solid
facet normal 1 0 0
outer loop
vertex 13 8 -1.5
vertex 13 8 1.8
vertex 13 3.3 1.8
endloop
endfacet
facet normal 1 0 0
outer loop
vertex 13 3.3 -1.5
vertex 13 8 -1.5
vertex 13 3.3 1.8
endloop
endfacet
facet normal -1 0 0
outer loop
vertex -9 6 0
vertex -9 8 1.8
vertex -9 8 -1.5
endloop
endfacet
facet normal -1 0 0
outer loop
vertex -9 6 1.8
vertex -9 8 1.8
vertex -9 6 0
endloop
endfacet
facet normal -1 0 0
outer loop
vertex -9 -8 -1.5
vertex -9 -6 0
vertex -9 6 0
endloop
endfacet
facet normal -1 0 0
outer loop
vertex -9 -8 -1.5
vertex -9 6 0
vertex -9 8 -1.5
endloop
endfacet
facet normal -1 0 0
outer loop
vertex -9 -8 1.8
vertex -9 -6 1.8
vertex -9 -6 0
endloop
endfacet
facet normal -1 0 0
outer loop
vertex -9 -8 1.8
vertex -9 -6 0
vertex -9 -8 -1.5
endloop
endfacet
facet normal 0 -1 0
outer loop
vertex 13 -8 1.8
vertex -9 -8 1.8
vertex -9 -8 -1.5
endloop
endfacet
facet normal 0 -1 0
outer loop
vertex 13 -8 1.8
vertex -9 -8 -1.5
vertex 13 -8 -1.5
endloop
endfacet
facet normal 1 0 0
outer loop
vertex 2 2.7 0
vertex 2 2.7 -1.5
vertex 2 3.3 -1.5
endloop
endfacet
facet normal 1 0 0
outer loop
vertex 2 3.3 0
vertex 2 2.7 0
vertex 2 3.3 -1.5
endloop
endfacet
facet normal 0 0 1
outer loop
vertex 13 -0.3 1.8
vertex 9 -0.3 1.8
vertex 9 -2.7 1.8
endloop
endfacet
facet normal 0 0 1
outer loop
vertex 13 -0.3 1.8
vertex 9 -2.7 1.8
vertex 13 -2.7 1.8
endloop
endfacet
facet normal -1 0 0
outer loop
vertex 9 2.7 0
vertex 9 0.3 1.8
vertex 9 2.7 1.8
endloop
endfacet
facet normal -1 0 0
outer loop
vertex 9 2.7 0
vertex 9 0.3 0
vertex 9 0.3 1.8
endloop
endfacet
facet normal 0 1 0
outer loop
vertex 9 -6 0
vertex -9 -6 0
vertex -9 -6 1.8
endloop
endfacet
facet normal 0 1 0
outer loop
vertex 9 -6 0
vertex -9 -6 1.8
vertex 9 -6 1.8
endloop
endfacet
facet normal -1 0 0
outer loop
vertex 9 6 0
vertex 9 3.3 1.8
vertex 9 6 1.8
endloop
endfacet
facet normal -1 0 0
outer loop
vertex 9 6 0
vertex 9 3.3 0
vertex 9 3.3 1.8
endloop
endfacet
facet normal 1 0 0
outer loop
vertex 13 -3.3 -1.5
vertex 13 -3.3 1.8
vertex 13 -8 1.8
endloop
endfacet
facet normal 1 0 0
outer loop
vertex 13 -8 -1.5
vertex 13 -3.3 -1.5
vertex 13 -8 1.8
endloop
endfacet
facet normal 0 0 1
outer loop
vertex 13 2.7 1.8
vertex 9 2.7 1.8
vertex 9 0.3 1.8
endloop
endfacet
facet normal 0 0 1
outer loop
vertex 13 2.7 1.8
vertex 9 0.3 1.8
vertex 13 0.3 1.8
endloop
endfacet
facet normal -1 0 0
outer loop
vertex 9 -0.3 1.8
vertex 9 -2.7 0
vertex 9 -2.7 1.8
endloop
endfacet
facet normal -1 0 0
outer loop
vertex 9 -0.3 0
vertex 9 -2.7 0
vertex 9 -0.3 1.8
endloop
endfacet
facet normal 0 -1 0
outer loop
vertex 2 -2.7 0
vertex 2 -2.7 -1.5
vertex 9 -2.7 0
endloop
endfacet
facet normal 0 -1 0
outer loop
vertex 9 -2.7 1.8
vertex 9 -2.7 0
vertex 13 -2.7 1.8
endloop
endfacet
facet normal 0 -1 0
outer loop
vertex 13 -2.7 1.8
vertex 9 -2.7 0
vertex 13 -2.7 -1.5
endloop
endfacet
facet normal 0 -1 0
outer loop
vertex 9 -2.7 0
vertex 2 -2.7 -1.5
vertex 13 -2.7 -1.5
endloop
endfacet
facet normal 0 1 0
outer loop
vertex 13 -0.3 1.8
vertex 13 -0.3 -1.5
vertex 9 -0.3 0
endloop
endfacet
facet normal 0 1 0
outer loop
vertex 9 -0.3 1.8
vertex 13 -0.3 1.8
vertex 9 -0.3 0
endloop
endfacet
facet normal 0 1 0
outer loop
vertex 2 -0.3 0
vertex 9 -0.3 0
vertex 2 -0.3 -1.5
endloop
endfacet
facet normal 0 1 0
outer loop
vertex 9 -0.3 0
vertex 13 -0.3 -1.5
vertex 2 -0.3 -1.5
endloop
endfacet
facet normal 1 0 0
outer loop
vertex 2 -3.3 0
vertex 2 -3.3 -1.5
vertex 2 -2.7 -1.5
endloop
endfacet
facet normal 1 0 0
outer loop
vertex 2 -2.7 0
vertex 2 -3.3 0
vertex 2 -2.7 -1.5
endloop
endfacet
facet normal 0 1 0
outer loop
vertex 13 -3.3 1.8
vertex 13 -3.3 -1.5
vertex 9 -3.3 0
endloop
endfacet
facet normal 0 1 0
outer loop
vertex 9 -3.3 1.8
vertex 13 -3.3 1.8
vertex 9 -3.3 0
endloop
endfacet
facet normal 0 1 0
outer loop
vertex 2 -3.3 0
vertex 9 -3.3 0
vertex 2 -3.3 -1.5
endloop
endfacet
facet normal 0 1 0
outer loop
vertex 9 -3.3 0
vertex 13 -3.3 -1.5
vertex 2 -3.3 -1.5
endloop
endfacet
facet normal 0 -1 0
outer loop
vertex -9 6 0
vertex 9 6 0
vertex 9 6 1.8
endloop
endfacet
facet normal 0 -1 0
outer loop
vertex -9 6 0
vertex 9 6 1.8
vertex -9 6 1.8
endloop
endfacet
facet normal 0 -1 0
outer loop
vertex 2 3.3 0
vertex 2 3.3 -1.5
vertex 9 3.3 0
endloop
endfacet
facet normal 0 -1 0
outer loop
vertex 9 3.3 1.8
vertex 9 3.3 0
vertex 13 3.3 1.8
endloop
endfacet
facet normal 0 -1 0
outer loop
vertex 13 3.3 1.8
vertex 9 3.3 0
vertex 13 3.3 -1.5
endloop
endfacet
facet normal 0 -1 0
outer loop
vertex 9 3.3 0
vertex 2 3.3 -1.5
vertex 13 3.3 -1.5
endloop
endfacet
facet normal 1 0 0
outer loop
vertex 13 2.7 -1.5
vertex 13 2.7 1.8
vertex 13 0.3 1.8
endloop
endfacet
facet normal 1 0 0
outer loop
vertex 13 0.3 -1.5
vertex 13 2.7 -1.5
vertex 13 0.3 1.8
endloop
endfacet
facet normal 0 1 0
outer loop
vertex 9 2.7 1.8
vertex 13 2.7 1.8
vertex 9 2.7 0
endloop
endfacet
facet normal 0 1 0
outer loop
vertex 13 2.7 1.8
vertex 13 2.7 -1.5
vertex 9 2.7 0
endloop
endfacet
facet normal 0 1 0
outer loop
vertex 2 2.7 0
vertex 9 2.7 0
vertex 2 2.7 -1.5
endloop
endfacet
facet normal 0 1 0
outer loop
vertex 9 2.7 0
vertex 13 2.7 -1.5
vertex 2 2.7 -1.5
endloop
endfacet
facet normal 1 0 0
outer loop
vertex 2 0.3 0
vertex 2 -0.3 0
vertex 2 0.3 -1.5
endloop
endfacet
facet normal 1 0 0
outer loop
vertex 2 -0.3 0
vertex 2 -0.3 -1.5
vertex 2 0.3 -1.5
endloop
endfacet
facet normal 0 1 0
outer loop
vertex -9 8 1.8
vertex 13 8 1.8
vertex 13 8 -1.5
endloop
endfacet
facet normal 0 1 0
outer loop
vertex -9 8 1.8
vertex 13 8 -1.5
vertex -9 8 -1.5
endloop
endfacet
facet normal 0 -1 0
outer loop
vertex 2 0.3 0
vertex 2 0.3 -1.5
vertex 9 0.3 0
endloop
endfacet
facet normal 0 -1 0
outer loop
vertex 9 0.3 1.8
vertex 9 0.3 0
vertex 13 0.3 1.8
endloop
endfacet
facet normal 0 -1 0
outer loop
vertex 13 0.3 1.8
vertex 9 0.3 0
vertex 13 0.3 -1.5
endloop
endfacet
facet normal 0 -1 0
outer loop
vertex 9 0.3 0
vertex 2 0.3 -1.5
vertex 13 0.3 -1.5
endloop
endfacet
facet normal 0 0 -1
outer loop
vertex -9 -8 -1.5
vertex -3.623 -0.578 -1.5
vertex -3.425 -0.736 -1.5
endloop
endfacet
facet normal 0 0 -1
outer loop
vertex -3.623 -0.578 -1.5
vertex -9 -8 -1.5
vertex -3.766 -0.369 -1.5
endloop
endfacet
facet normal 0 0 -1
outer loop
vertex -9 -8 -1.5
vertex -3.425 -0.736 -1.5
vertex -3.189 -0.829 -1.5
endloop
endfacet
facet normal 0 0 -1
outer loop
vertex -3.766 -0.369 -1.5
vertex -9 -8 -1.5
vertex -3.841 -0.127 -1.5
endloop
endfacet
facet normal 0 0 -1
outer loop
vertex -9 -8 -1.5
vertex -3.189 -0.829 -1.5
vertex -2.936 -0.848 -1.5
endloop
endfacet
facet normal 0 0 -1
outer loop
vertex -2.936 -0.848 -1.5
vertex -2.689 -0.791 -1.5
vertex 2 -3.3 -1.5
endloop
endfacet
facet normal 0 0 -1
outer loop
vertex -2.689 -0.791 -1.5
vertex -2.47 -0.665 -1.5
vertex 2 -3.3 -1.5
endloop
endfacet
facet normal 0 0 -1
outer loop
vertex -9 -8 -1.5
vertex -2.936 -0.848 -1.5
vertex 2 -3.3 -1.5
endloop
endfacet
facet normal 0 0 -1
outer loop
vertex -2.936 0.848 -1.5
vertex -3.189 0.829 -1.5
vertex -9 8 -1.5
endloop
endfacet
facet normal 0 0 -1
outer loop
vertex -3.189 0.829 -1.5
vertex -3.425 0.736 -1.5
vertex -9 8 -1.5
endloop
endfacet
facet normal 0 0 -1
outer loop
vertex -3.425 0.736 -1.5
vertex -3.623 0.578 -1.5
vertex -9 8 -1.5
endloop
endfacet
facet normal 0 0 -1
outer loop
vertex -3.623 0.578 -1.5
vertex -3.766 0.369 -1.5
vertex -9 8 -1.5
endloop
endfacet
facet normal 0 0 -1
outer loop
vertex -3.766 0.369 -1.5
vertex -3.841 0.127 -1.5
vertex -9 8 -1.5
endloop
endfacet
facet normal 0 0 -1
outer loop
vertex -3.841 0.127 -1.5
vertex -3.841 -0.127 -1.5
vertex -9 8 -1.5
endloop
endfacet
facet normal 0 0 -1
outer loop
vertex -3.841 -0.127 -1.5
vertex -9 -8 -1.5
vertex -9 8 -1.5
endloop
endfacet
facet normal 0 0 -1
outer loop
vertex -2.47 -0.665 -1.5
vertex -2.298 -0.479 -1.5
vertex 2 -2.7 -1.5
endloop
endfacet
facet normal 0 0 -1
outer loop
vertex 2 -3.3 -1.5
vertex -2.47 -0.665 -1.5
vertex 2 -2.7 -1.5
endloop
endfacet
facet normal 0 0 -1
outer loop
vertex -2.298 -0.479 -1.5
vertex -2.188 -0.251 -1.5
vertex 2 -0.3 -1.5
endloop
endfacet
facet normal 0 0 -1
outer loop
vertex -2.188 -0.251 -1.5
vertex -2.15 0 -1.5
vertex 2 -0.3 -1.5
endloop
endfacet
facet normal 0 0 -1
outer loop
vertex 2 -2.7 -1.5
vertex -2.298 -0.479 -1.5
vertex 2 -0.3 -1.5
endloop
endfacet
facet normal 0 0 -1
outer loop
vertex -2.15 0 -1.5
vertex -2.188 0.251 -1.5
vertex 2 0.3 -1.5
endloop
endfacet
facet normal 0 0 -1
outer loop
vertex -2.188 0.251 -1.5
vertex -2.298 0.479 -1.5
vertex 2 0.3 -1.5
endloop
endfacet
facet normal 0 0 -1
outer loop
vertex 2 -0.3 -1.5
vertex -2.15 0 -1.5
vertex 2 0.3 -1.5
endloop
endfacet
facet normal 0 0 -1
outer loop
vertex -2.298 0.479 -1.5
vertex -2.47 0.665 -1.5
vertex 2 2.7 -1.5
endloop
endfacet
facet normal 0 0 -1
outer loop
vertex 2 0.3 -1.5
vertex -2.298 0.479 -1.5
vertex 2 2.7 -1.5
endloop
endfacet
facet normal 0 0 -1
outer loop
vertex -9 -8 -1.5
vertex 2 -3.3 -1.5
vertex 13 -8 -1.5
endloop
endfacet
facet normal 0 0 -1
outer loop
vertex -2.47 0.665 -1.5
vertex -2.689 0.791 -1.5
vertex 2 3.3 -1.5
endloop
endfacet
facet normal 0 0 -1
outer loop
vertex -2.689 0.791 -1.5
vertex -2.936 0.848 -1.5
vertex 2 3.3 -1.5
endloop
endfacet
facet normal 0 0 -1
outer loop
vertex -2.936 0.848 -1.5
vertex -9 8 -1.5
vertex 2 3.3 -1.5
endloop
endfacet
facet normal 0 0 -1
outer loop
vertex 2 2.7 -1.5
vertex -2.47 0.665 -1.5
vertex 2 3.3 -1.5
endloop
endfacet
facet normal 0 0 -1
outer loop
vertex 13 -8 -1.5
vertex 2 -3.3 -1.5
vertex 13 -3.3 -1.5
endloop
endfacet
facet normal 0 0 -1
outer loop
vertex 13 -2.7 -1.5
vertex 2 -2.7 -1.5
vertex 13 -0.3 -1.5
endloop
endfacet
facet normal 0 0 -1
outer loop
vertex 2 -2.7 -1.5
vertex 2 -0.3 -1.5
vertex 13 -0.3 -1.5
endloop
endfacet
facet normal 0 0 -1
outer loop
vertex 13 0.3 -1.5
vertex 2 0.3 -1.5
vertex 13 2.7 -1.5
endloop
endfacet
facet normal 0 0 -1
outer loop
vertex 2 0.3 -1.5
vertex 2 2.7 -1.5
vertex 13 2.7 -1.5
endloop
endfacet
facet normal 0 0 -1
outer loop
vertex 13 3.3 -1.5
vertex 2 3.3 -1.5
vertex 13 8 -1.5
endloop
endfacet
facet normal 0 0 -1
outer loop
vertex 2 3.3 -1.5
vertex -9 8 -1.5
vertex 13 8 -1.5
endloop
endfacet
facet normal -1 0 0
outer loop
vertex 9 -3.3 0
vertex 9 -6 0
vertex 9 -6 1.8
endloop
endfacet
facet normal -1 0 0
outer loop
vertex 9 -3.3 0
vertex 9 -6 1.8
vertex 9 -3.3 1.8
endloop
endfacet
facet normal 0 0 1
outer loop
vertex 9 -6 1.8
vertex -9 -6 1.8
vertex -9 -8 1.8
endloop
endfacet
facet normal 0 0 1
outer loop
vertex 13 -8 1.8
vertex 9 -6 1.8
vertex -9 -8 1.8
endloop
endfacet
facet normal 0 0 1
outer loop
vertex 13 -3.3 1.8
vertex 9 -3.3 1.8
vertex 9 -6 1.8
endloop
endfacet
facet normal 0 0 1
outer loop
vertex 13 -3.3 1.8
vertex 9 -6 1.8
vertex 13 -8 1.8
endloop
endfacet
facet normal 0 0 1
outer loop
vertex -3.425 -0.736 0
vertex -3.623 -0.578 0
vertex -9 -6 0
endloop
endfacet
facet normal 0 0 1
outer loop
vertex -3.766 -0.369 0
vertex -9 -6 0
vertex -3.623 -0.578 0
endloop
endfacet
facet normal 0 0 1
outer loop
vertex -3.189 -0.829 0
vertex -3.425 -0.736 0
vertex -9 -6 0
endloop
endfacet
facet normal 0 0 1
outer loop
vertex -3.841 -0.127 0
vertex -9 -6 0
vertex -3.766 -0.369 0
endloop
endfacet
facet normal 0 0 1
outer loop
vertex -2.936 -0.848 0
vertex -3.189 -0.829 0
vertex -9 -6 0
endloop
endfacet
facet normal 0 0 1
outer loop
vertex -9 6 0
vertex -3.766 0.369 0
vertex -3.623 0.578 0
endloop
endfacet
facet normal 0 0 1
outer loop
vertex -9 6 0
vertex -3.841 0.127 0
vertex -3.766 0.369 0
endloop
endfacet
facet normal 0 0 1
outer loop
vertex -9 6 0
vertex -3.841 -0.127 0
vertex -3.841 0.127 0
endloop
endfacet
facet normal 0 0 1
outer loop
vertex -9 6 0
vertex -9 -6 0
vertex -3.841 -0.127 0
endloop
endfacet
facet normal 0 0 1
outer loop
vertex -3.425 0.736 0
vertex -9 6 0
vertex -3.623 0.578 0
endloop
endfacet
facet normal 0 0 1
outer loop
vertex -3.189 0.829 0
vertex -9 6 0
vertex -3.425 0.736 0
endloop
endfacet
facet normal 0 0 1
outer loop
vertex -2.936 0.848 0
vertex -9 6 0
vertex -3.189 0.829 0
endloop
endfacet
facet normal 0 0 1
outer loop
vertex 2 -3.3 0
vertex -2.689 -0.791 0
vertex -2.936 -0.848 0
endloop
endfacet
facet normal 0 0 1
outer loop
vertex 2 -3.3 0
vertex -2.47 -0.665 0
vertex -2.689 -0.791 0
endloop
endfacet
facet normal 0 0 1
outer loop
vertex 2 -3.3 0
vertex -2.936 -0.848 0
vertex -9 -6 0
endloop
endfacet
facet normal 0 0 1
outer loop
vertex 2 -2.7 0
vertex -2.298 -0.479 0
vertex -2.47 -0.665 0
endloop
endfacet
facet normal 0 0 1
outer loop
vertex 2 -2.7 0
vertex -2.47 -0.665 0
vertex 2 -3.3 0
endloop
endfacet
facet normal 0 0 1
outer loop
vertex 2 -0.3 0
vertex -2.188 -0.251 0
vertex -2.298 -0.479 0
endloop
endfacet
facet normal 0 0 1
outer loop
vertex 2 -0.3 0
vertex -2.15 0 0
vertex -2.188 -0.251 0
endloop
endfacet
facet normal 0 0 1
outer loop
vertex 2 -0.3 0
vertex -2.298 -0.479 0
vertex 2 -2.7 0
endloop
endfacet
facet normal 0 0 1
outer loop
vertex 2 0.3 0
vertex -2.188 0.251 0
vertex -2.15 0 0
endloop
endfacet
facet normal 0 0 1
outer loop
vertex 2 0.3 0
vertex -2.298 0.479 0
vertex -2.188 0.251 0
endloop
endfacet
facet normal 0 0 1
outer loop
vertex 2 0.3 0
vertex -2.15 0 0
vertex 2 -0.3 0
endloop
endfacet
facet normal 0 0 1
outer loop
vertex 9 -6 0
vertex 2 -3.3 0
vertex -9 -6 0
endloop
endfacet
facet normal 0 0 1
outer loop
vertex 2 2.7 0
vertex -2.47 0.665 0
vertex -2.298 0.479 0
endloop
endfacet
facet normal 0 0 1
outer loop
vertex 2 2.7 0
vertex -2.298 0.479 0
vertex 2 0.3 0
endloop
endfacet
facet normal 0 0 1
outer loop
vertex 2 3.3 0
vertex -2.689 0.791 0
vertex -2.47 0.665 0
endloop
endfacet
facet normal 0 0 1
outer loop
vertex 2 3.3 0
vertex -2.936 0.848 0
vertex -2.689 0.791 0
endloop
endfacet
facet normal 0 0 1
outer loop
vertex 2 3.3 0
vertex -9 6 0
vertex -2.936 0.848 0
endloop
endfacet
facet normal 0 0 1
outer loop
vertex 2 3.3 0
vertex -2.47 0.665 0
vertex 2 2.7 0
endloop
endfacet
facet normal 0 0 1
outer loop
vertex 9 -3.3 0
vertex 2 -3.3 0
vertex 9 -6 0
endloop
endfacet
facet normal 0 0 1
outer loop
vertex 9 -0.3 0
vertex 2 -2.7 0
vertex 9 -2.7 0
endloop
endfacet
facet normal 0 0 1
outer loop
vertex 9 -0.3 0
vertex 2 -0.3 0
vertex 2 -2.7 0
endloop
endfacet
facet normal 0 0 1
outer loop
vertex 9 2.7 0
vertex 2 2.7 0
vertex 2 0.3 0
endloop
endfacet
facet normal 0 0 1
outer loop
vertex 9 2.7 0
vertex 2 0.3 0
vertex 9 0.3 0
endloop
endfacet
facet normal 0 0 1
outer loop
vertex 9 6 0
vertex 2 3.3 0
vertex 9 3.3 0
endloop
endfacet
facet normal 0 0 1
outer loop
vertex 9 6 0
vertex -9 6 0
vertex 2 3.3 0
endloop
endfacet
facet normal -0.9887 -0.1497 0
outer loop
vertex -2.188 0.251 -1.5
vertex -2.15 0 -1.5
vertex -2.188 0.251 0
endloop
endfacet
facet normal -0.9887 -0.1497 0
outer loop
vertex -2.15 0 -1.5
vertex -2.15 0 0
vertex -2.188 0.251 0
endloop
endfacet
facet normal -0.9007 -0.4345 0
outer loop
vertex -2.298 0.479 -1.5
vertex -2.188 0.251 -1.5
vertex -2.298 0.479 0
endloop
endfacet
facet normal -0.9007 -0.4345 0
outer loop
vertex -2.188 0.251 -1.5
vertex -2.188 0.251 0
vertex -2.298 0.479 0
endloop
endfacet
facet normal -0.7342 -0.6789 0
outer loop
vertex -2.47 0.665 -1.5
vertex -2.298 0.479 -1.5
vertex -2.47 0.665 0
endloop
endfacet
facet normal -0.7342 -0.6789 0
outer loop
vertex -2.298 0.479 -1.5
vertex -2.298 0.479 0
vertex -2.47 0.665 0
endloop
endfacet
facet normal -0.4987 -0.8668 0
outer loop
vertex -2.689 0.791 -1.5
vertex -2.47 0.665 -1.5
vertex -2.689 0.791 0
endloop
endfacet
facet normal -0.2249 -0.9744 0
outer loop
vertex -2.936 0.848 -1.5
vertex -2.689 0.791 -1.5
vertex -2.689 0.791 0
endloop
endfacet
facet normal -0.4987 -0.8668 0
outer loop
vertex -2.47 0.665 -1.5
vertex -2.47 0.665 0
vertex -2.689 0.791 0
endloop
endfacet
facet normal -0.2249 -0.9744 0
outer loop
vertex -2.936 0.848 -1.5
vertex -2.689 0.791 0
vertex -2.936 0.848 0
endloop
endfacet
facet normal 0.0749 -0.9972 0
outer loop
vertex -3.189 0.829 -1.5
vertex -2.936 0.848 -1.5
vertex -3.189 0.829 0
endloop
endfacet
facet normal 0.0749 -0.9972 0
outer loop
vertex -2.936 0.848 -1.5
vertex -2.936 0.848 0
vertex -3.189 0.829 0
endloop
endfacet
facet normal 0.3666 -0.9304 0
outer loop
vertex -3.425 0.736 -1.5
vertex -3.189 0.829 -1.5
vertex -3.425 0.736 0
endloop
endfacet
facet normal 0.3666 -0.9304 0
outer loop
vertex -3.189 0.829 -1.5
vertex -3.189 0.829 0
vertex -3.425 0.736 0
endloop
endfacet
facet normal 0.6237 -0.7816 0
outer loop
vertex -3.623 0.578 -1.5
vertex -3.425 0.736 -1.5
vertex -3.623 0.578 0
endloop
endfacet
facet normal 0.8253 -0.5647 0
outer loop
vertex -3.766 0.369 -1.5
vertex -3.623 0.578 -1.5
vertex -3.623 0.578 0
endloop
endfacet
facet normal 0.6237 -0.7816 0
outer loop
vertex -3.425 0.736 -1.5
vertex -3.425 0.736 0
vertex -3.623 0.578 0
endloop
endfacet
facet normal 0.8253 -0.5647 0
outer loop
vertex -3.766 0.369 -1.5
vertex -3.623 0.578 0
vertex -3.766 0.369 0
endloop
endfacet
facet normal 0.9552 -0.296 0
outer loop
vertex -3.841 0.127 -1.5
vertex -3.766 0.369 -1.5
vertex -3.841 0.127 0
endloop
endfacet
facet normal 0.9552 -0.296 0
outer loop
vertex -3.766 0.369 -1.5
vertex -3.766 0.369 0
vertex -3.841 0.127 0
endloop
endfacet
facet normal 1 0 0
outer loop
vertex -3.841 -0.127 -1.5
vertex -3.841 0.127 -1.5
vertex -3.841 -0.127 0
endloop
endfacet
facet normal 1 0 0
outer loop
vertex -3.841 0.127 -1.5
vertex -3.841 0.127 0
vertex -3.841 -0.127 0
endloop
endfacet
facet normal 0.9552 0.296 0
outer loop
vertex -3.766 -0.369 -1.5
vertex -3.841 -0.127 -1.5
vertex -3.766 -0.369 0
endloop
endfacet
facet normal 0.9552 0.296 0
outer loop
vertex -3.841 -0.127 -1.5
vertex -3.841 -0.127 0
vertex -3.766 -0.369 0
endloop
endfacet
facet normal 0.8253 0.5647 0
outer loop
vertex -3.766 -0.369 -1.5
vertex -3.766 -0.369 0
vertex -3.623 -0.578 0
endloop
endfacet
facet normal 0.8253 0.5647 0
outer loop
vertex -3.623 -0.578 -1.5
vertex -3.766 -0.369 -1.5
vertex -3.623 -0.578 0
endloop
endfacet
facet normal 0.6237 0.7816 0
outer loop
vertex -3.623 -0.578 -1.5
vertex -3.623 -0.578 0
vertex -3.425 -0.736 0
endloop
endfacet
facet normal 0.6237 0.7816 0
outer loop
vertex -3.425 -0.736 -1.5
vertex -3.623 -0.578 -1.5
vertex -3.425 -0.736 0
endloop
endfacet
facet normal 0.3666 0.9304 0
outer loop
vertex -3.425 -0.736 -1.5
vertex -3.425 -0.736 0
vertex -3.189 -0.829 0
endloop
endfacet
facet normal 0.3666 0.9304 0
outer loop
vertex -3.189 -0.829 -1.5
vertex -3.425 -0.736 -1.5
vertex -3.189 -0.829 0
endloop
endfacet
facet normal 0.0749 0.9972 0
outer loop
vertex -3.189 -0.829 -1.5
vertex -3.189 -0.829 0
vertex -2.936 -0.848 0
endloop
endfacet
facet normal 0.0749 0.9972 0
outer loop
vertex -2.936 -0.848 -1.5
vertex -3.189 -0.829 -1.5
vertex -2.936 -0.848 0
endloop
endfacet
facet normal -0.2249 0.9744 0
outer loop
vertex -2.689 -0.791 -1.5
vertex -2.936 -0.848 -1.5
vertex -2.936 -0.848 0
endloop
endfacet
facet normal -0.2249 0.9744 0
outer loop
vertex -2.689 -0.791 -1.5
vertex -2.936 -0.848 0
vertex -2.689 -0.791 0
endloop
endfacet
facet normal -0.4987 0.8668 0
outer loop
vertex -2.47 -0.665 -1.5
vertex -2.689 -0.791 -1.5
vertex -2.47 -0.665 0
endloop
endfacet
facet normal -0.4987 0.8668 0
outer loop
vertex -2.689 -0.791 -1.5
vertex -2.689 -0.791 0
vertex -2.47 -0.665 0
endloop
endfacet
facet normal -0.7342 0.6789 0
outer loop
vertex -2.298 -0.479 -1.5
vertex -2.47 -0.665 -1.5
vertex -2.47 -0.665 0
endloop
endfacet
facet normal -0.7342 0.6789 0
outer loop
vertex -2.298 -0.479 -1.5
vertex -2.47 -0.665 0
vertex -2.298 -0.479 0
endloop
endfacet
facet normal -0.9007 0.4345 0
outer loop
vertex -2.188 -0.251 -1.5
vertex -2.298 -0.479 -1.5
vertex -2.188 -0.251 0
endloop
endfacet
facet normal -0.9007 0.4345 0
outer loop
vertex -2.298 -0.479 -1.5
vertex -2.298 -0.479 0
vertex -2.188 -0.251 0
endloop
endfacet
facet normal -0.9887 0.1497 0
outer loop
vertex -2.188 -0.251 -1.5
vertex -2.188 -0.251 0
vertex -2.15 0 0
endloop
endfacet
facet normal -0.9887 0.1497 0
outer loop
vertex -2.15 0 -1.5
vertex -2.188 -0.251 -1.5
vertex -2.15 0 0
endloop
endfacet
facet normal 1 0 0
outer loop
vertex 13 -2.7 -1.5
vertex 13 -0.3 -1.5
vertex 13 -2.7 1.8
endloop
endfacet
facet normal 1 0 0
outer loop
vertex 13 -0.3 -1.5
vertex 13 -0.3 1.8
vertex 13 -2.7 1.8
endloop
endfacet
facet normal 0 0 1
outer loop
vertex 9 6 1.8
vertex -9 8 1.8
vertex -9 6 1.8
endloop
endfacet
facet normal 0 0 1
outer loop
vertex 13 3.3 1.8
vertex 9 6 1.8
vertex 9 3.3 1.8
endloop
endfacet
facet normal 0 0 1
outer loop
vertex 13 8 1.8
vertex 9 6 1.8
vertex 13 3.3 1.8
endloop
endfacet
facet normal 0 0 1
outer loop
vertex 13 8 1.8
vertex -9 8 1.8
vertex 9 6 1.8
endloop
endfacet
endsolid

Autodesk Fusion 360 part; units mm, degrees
sketch "Main Body" plane through (0, 0, 0) normal (0, 0, 1) x (1, 0, 0)
  line L0 (9, 8) -> (-9, 8)
  line L1 (-9, 8) -> (-9, -8)
  line L2 (-9, -8) -> (9, -8)
  line L3 (9, -8) -> (9, 8)
  line L4 (9, 8) -> (-9, -8) construction
  line L5 (-9, 8) -> (9, -8) construction
  line L6 (9, 8) -> (13, 8)
  line L7 (13, 8) -> (13, -8)
  line L8 (13, -8) -> (9, -8)
  line L9 (9, -8) -> (9, 8)
  line L10 (9, 6) -> (-9, 6)
  line L11 (-9, -6) -> (9, -6)
  line L12 (2, 3.3) -> (13, 3.3)
  line L13 (13, 3.3) -> (13, 2.7)
  line L14 (13, 2.7) -> (2, 2.7)
  line L15 (2, 2.7) -> (2, 3.3)
  circle A0 centre (-3, 0) radius 0.85
  point P0 (2, 3)
  dimension "d4" = 18
  dimension "d5" = 4
  dimension "d7" = 16
  dimension "d8" = -2
  dimension "d9" = -2
  dimension "d10" = 0.6
  dimension "d11" = 7
  dimension "d12" = 3
  dimension "d26" = 1.7
  dimension "d27" = 6
extrude "Base" add sketch "Main Body" against normal blind 1.5 contours L0 L1 L3 L9 L10 | L3 L6 L7 L9 L12 | L1 L3 L9 L10 L11 L12 L14 L15 | L3 L7 L9 L12 L13 L14 | L3 L9 L12 L14 L15 | L1 L2 L3 L9 L11 | L3 L7 L8 L9 L14 | A0
extrude "Guide" add sketch "Main Body" along normal blind 1.8 contours L0 L1 L3 L9 L10 | L3 L6 L7 L9 L12 | L3 L7 L9 L12 L13 L14 | L1 L2 L3 L9 L11 | L3 L7 L8 L9 L14
extrude "Bristle Cut" cut sketch "Main Body" along normal through all and the other way through all contours L3 L7 L9 L12 L13 L14 | L3 L9 L12 L14 L15
pattern_linear "Bristle Pattern" count 3 spacing 3 along (0, -1, 0) of "Bristle Cut"
extrude "Fixing Hole" cut sketch "Main Body" against normal through all contours A0
equation "SegmentLength = 18 mm" comment "Band Cut Length default 18mm"
equation "NumBristles = 4" comment "Number of Bristles per Segment"
equation "d4 = SegmentLength"
equation "BandWidth = 12 mm" comment "Width of Silicont Band"
equation "d7 = BandWidth + 4 mm"
equation "d11 = SegmentLength - 11 mm"
equation "d12 = BandWidth / NumBristles"
equation "d15 = BandThickness - 0.2 mm"
equation "d19 = NumBristles - 1"
equation "d21 = -BandWidth / NumBristles"
equation "BandThickness = 2 mm" comment "Thickness of band"
